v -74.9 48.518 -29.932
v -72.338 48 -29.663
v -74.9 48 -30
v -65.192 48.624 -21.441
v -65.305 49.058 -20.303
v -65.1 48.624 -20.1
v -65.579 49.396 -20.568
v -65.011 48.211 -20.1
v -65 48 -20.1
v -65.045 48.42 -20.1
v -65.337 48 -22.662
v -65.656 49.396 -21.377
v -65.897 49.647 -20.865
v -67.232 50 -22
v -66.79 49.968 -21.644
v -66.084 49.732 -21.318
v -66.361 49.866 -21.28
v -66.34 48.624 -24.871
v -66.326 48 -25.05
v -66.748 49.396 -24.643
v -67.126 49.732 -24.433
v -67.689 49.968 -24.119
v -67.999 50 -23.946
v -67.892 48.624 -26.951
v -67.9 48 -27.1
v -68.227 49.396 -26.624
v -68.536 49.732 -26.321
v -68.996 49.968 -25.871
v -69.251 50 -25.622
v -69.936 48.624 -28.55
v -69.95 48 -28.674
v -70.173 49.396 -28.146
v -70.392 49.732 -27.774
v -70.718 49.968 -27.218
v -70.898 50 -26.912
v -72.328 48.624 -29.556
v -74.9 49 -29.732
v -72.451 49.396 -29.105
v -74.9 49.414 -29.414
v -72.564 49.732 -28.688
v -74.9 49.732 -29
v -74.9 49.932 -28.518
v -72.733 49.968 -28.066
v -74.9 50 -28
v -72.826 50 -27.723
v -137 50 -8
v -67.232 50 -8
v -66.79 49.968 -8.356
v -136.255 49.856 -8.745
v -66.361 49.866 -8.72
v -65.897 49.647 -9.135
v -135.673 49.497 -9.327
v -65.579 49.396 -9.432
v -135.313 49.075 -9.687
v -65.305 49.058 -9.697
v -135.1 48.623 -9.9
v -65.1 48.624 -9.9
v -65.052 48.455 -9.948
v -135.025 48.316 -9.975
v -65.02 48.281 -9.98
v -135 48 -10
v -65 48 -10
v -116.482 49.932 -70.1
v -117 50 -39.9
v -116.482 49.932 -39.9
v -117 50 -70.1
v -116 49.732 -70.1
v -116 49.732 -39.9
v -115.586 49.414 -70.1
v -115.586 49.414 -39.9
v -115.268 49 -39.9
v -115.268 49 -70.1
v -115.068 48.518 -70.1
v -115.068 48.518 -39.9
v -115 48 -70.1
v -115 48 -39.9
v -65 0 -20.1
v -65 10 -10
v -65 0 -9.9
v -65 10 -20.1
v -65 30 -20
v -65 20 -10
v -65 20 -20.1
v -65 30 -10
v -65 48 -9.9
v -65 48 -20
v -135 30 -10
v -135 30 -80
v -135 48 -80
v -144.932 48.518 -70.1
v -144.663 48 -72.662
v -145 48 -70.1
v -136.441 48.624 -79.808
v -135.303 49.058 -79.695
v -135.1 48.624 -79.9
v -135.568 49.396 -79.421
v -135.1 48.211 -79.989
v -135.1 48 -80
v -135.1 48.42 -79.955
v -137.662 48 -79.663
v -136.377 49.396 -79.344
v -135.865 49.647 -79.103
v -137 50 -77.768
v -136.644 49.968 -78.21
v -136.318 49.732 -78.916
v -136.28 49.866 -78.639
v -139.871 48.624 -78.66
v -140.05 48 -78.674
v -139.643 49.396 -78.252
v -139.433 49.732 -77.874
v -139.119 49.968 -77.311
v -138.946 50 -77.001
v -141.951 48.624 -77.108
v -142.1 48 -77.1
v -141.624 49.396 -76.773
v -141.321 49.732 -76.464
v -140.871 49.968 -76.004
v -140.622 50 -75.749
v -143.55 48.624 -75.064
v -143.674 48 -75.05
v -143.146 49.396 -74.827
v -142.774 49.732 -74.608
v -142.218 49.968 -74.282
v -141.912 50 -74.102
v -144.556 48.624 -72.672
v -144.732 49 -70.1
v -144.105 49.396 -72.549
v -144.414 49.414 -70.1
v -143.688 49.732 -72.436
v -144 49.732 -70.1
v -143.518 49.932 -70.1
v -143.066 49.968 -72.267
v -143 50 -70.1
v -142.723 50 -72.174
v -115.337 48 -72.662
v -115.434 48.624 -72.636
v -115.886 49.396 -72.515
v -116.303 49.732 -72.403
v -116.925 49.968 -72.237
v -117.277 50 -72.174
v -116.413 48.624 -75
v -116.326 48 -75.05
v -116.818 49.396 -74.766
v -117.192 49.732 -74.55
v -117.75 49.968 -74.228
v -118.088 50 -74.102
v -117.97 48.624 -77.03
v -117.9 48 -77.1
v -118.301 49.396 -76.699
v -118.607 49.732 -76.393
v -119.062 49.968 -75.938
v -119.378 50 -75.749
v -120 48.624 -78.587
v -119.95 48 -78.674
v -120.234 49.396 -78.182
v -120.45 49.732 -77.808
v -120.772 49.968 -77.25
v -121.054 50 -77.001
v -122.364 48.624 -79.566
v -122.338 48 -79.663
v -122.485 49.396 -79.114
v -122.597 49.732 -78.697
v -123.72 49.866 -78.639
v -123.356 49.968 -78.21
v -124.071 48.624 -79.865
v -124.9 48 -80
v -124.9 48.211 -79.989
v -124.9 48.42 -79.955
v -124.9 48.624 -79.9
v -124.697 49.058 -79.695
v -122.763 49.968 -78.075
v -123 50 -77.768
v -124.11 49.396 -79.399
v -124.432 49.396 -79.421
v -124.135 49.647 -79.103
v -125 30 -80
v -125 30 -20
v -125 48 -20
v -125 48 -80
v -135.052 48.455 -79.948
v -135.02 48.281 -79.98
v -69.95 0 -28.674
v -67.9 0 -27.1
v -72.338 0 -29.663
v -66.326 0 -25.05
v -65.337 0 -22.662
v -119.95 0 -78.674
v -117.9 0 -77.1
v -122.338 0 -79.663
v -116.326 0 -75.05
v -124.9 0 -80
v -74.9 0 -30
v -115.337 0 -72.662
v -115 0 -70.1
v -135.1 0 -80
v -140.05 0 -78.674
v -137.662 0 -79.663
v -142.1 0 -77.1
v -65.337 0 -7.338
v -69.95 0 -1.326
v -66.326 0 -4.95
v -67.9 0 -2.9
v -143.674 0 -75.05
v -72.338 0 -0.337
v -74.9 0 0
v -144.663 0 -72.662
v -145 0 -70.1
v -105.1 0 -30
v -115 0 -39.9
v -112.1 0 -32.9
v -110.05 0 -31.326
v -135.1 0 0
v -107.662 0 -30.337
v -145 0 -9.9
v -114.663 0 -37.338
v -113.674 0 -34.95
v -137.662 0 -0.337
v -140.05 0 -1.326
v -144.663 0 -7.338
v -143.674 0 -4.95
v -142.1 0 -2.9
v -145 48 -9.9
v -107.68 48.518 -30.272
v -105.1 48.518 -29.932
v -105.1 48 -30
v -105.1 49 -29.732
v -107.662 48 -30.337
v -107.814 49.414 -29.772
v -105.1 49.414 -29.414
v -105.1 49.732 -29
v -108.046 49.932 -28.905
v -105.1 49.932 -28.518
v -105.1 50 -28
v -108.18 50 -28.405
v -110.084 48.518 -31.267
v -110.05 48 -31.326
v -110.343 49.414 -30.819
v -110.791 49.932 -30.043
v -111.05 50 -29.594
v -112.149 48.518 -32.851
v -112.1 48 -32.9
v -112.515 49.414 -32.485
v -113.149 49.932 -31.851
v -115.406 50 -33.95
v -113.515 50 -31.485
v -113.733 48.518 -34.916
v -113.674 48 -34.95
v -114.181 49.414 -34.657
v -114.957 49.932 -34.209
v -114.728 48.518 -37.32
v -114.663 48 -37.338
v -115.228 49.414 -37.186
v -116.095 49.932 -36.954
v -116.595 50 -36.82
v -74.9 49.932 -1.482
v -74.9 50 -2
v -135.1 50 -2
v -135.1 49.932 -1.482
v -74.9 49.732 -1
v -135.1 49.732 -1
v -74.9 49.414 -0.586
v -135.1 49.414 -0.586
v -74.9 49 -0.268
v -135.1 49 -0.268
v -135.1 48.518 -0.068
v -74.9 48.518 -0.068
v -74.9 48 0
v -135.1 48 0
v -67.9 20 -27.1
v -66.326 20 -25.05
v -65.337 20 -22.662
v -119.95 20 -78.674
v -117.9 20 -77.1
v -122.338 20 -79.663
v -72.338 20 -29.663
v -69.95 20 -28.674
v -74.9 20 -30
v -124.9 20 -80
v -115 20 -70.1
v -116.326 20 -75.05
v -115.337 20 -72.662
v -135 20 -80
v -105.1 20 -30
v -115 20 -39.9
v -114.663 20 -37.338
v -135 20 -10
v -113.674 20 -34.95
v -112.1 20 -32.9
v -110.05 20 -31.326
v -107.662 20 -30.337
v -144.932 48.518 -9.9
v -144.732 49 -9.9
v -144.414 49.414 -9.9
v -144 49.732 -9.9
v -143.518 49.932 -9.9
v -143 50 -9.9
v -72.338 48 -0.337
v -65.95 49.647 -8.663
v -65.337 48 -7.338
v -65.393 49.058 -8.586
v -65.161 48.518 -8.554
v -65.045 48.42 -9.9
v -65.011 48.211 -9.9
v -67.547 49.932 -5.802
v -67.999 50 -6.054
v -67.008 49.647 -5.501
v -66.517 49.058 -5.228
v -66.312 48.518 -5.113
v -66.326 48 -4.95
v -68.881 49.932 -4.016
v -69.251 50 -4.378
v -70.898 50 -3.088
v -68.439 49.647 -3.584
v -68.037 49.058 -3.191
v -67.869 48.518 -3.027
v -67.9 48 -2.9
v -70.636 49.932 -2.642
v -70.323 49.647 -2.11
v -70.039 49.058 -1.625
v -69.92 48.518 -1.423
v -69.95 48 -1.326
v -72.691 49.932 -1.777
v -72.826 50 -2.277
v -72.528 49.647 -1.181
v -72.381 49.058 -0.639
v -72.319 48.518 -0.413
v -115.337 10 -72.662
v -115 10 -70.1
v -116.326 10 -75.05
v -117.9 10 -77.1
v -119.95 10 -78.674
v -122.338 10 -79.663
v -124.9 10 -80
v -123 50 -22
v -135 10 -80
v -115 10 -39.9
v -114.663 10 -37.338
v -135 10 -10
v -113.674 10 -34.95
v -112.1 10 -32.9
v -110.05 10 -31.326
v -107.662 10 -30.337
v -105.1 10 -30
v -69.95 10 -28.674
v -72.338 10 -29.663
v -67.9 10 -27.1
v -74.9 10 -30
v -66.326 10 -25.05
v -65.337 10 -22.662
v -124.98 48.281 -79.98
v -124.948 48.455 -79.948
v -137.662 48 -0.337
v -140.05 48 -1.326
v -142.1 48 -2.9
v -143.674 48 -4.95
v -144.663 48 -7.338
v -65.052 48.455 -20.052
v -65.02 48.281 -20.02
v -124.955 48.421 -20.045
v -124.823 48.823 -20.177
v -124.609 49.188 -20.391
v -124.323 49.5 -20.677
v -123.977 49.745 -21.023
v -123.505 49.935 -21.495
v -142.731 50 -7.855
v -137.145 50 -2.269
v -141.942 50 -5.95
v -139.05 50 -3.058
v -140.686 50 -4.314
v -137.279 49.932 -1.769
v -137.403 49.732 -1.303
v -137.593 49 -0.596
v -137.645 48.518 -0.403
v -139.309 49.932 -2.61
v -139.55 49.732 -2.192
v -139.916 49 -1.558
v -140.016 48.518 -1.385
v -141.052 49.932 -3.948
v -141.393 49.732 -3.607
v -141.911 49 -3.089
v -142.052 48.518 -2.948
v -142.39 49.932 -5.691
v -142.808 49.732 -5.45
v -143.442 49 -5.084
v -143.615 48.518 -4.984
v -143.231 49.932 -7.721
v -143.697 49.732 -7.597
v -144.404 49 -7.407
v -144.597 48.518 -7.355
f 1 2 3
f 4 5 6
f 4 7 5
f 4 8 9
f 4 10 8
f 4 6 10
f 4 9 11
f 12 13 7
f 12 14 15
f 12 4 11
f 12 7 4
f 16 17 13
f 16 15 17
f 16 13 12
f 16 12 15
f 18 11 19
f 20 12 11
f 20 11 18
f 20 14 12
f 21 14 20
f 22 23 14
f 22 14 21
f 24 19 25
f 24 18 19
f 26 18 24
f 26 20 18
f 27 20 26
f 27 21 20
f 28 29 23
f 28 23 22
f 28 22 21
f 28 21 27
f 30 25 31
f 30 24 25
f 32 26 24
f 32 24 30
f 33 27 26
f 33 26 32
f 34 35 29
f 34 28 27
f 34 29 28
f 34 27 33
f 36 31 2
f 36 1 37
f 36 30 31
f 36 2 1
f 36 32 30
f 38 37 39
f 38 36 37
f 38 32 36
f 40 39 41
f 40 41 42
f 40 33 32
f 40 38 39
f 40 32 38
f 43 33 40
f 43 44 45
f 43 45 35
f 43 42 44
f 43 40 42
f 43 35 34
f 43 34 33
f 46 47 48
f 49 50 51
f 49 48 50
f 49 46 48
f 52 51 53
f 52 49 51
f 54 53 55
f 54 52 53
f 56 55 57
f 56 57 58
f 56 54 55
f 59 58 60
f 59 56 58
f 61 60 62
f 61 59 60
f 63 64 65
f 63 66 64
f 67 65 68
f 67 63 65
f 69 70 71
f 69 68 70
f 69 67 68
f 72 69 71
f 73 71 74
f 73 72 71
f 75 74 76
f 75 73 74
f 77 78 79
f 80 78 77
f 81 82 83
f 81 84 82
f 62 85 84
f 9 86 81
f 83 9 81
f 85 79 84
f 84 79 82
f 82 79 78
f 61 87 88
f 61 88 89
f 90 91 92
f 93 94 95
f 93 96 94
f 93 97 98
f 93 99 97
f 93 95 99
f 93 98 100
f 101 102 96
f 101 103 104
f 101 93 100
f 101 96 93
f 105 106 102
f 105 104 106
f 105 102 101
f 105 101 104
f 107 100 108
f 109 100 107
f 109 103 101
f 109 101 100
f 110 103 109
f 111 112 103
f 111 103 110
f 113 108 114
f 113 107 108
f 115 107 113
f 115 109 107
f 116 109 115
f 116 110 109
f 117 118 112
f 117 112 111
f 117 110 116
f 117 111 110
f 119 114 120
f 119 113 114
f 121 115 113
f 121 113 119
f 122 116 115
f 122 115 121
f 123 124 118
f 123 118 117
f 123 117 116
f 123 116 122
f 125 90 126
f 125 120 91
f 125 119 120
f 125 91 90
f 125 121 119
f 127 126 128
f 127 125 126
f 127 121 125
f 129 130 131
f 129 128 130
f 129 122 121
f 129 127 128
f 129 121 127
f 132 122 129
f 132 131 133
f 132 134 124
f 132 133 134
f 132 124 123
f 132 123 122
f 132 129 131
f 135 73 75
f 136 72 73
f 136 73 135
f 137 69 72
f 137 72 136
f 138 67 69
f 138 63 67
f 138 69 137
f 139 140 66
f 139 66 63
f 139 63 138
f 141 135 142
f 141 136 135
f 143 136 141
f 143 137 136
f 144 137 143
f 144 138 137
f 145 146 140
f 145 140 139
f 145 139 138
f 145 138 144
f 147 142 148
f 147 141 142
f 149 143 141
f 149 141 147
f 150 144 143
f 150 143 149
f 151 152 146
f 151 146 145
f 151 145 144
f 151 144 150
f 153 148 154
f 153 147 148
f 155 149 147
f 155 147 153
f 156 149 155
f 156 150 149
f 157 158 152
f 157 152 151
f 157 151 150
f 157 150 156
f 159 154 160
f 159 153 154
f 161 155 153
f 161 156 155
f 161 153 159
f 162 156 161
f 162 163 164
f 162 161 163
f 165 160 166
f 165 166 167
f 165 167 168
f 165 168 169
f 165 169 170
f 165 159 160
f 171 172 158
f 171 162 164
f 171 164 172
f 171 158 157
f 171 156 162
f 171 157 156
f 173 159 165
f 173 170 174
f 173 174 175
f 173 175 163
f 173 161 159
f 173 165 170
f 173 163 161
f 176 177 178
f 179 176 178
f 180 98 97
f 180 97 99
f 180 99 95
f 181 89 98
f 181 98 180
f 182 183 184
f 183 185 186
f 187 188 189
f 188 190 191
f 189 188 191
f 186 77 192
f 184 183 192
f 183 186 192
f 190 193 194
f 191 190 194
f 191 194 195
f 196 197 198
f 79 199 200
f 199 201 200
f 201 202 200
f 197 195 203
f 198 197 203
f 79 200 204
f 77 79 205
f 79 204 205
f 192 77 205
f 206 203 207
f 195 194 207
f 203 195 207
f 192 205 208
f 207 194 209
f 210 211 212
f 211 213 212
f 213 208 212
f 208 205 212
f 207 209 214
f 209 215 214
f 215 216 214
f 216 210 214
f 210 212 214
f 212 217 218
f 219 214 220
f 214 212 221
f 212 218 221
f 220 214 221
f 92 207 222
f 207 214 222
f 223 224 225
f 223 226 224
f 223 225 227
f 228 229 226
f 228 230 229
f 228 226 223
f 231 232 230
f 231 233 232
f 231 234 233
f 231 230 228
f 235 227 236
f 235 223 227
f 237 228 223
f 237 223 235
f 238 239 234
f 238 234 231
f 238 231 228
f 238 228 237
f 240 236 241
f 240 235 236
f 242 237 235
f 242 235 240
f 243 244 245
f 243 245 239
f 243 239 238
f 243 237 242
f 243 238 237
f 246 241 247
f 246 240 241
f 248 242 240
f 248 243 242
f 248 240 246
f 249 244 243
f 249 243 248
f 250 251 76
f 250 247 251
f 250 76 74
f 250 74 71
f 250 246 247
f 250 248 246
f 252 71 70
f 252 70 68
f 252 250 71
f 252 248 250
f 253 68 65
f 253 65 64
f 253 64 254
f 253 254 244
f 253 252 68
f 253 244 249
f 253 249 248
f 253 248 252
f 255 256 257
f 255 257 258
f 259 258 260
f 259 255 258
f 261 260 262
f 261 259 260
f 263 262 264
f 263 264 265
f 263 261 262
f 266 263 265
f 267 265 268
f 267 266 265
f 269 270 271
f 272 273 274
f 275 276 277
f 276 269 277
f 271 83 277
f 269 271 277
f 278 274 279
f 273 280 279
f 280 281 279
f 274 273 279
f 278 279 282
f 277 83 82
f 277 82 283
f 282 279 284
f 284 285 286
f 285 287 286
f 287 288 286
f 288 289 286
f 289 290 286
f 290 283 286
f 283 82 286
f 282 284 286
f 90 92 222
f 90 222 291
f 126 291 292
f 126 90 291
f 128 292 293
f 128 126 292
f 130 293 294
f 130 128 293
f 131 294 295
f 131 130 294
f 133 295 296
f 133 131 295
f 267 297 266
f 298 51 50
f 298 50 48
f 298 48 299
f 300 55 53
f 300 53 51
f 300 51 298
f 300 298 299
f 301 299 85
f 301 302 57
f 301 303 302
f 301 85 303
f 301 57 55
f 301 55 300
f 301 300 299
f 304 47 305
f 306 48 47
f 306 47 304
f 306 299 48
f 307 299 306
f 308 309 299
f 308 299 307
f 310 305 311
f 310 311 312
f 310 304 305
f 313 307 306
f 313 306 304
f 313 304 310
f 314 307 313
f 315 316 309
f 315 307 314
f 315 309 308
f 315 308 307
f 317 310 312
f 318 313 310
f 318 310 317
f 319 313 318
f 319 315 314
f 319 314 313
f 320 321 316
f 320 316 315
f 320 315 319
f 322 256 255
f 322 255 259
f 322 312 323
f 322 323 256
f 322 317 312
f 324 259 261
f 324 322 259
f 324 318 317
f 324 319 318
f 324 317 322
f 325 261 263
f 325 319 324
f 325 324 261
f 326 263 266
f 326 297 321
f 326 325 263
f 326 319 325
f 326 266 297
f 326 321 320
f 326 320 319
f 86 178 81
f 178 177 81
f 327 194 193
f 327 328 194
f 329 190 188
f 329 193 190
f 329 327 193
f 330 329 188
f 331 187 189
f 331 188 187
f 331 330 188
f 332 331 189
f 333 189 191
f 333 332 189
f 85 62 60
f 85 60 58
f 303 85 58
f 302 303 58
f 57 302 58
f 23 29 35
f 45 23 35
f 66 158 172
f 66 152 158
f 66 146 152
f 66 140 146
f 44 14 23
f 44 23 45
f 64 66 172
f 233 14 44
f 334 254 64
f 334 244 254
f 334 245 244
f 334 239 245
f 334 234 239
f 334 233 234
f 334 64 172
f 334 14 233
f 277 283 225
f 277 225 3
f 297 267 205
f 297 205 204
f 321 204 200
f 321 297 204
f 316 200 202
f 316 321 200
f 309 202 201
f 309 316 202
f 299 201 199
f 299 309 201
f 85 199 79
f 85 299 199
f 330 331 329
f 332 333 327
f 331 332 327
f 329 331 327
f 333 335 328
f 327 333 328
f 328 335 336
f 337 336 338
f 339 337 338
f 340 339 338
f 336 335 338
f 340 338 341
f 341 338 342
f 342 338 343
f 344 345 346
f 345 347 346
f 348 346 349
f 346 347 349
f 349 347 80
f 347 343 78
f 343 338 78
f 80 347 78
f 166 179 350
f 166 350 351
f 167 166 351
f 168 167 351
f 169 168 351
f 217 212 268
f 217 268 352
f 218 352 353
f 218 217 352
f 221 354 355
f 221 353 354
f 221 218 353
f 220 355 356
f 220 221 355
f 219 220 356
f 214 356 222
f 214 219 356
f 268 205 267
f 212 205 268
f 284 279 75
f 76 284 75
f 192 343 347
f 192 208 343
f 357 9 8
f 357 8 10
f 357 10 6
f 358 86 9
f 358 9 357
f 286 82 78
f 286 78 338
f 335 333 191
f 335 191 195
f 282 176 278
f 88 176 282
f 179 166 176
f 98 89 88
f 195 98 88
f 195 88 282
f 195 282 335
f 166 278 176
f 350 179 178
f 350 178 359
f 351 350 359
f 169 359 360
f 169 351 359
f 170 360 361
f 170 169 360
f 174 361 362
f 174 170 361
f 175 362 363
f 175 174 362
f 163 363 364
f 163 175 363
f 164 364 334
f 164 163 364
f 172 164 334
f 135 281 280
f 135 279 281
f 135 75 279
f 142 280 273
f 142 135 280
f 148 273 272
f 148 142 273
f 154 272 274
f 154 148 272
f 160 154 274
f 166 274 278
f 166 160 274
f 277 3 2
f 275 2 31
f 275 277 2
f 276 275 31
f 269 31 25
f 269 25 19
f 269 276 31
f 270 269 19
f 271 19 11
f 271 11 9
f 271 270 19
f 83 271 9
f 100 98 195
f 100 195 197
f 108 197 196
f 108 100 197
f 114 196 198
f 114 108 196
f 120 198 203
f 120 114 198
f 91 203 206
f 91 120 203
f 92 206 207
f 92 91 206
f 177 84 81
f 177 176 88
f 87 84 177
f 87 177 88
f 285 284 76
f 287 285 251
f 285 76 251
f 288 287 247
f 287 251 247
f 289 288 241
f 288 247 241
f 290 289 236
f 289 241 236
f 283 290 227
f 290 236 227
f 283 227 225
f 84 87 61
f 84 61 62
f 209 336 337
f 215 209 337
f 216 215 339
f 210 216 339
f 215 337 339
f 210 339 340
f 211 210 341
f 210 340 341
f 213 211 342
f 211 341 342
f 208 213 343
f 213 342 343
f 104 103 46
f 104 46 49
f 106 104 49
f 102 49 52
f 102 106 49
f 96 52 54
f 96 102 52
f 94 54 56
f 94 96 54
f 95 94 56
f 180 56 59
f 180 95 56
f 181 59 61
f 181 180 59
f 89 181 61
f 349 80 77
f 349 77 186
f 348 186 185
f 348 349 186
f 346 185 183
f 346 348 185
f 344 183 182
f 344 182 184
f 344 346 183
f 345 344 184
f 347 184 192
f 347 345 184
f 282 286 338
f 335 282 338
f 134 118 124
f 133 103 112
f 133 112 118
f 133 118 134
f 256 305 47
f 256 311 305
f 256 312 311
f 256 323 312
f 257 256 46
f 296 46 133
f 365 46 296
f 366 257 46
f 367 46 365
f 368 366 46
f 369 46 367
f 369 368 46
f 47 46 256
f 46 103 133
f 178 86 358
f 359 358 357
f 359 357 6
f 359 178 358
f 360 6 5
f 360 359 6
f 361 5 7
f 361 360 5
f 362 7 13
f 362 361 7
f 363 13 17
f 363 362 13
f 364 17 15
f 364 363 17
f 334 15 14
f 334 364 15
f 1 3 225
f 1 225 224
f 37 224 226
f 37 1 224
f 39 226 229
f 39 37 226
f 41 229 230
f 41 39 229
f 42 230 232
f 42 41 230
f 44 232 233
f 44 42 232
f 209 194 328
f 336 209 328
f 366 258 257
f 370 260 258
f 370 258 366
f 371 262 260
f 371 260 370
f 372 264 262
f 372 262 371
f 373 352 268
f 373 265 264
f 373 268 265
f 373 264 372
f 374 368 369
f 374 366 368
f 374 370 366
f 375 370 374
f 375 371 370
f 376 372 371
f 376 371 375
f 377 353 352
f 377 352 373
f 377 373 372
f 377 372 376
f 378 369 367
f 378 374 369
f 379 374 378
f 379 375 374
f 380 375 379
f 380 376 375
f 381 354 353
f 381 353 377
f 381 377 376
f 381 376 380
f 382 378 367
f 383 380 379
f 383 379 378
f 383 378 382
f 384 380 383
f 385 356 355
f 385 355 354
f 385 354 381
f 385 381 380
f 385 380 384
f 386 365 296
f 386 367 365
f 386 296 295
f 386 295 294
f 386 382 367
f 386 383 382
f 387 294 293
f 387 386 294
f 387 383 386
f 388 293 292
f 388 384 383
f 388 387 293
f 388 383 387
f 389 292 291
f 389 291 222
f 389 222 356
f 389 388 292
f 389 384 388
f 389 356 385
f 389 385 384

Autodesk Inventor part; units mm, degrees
ref_plane "YZ Plane" through (0, 0, 0) normal (1, 0, 0) x (0, 1, 0)
ref_plane "XZ Plane" through (0, 0, 0) normal (0, 1, 0) x (-1, 0, 0)
ref_plane "XY Plane" through (0, 0, 0) normal (0, 0, 1) x (1, 0, 0)
sketch "Sketch1" plane through (0, 0, 0) normal (0, 1, 0) x (-1, 0, 0)
  line L0 (0, 0) -> (145, 0)
  line L1 (145, 0) -> (145, -30)
  line L2 (145, -30) -> (0, -30)
  line L3 (0, -30) -> (0, 0)
  line L4 (145, 0) -> (115, 0)
  line L5 (115, 0) -> (115, -70)
  line L6 (115, -70) -> (145, -70)
  line L7 (145, -70) -> (145, 0)
  point P0 (115, -30)
  dimension "d0" = 145
  dimension "d1" = 30
  dimension "d2" = 30
  dimension "d3" = 70
extrude "Extrusion1" add sketch "Sketch1" along normal blind 30
sketch "Sketch2" plane through (0, 0, -30) normal (0, 0, -1) x (-1, 0, 0)
  line L0 (0, 20) -> (135, 20)
  line L1 (135, 20) -> (135, 10)
  line L2 (135, 10) -> (0, 10)
  line L3 (0, 10) -> (0, 20)
  dimension "d32" = 135
  dimension "d33" = 10
extrude "Extrusion2" cut sketch "Sketch2" along normal blind 50 and the other way blind 20
sketch "Sketch4" plane through (0, 30, 0) normal (0, 1, 0) x (1, 0, 0)
  line L0 (0, 0) -> (-145, 0)
  line L1 (-145, 0) -> (-145, 10)
  line L2 (-145, 10) -> (0, 10)
  line L3 (0, 10) -> (0, 0)
  line L4 (-115, 70) -> (-145, 70) projected
  line L5 (-145, 70) -> (-135, 70)
  line L6 (-135, 70) -> (-135, 10)
  line L7 (-135, 10) -> (-145, 10)
  line L8 (-145, 10) -> (-145, 70)
  line L9 (-115, 30) -> (-115, 70) projected
  line L10 (-115, 70) -> (-125, 70)
  line L11 (-125, 70) -> (-125, 30)
  line L12 (-125, 30) -> (-115, 30)
  line L13 (-115, 30) -> (-115, 70)
  line L14 (0, 30) -> (-125, 30)
  line L15 (-125, 30) -> (-125, 20)
  line L16 (-125, 20) -> (0, 20)
  line L17 (0, 20) -> (0, 30)
  dimension "d22" = 145
  dimension "d23" = 10
  dimension "d24" = 10
  dimension "d25" = 60
  dimension "d26" = 10
  dimension "d27" = 40
  dimension "d28" = 125
  dimension "d29" = 10
extrude "Extrusion4" add sketch "Sketch4" along normal blind 20
sketch "Sketch5" plane through (0, 0, 0) normal (1, 0, 0) x (0, 0, -1)
  line L0 (0, 0) -> (0, 50) projected
  line L1 (30, 0) -> (30, 10) projected
  line L2 (0, 50) -> (30, 50)
  line L3 (30, 50) -> (30, 0)
  line L4 (30, 0) -> (0, 0)
  line L5 (0, 0) -> (0, 50)
extrude "Extrusion5" cut sketch "Sketch5" against normal blind 65
sketch "Sketch6" plane through (-115, 0, -70) normal (0, 0, -1) x (-1, 0, 0)
  line L0 (20, 10) -> (0, 10) projected
  line L1 (0, 0) -> (0, 10) projected
  line L2 (0, 0) -> (30, 0) projected
  line L3 (30, 0) -> (30, 50) projected
  line L4 (20, 50) -> (30, 50) projected
  line L5 (20, 30) -> (20, 50) projected
  line L6 (10, 30) -> (20, 30) projected
  line L7 (10, 30) -> (10, 50) projected
  line L8 (0, 50) -> (10, 50) projected
  line L9 (0, 20) -> (0, 50) projected
  line L10 (0, 20) -> (20, 20) projected
  line L11 (20, 20) -> (20, 10) projected
  point P0 (-115, 0)
extrude "Extrusion6" add sketch "Sketch6" along normal blind 10
fillet "Fillet1" radius 9.9 9 edges at (-115, 35, -30) (-115, 5, -30) (-115, 35, -80) (-115, 5, -80) (-65, 35, -30) (-65, 5, -30) (-145, 25, -80) (-65, 25, 0) (-145, 25, 0)
fillet "Fillet2" radius 2 18 edges at (-67.8996, 50, -2.8996) (-65, 50, -9.95) (-142.1004, 50, -2.8996) (-145, 50, -40) (-142.1004, 50, -77.1004) (-135.05, 50, -80) (-105, 50, 0) (-100, 50, -10) (-125, 50, -50) (-95, 50, -20) (-112.1004, 50, -32.8996) (-115, 50, -55) (-117.8996, 50, -77.1004) (-124.95, 50, -80) (-67.8996, 50, -27.1004) (-65, 50, -20.05) (-90, 50, -30) (-135, 50, -45)
properties part number "TSU_Corner1_Clamp"
